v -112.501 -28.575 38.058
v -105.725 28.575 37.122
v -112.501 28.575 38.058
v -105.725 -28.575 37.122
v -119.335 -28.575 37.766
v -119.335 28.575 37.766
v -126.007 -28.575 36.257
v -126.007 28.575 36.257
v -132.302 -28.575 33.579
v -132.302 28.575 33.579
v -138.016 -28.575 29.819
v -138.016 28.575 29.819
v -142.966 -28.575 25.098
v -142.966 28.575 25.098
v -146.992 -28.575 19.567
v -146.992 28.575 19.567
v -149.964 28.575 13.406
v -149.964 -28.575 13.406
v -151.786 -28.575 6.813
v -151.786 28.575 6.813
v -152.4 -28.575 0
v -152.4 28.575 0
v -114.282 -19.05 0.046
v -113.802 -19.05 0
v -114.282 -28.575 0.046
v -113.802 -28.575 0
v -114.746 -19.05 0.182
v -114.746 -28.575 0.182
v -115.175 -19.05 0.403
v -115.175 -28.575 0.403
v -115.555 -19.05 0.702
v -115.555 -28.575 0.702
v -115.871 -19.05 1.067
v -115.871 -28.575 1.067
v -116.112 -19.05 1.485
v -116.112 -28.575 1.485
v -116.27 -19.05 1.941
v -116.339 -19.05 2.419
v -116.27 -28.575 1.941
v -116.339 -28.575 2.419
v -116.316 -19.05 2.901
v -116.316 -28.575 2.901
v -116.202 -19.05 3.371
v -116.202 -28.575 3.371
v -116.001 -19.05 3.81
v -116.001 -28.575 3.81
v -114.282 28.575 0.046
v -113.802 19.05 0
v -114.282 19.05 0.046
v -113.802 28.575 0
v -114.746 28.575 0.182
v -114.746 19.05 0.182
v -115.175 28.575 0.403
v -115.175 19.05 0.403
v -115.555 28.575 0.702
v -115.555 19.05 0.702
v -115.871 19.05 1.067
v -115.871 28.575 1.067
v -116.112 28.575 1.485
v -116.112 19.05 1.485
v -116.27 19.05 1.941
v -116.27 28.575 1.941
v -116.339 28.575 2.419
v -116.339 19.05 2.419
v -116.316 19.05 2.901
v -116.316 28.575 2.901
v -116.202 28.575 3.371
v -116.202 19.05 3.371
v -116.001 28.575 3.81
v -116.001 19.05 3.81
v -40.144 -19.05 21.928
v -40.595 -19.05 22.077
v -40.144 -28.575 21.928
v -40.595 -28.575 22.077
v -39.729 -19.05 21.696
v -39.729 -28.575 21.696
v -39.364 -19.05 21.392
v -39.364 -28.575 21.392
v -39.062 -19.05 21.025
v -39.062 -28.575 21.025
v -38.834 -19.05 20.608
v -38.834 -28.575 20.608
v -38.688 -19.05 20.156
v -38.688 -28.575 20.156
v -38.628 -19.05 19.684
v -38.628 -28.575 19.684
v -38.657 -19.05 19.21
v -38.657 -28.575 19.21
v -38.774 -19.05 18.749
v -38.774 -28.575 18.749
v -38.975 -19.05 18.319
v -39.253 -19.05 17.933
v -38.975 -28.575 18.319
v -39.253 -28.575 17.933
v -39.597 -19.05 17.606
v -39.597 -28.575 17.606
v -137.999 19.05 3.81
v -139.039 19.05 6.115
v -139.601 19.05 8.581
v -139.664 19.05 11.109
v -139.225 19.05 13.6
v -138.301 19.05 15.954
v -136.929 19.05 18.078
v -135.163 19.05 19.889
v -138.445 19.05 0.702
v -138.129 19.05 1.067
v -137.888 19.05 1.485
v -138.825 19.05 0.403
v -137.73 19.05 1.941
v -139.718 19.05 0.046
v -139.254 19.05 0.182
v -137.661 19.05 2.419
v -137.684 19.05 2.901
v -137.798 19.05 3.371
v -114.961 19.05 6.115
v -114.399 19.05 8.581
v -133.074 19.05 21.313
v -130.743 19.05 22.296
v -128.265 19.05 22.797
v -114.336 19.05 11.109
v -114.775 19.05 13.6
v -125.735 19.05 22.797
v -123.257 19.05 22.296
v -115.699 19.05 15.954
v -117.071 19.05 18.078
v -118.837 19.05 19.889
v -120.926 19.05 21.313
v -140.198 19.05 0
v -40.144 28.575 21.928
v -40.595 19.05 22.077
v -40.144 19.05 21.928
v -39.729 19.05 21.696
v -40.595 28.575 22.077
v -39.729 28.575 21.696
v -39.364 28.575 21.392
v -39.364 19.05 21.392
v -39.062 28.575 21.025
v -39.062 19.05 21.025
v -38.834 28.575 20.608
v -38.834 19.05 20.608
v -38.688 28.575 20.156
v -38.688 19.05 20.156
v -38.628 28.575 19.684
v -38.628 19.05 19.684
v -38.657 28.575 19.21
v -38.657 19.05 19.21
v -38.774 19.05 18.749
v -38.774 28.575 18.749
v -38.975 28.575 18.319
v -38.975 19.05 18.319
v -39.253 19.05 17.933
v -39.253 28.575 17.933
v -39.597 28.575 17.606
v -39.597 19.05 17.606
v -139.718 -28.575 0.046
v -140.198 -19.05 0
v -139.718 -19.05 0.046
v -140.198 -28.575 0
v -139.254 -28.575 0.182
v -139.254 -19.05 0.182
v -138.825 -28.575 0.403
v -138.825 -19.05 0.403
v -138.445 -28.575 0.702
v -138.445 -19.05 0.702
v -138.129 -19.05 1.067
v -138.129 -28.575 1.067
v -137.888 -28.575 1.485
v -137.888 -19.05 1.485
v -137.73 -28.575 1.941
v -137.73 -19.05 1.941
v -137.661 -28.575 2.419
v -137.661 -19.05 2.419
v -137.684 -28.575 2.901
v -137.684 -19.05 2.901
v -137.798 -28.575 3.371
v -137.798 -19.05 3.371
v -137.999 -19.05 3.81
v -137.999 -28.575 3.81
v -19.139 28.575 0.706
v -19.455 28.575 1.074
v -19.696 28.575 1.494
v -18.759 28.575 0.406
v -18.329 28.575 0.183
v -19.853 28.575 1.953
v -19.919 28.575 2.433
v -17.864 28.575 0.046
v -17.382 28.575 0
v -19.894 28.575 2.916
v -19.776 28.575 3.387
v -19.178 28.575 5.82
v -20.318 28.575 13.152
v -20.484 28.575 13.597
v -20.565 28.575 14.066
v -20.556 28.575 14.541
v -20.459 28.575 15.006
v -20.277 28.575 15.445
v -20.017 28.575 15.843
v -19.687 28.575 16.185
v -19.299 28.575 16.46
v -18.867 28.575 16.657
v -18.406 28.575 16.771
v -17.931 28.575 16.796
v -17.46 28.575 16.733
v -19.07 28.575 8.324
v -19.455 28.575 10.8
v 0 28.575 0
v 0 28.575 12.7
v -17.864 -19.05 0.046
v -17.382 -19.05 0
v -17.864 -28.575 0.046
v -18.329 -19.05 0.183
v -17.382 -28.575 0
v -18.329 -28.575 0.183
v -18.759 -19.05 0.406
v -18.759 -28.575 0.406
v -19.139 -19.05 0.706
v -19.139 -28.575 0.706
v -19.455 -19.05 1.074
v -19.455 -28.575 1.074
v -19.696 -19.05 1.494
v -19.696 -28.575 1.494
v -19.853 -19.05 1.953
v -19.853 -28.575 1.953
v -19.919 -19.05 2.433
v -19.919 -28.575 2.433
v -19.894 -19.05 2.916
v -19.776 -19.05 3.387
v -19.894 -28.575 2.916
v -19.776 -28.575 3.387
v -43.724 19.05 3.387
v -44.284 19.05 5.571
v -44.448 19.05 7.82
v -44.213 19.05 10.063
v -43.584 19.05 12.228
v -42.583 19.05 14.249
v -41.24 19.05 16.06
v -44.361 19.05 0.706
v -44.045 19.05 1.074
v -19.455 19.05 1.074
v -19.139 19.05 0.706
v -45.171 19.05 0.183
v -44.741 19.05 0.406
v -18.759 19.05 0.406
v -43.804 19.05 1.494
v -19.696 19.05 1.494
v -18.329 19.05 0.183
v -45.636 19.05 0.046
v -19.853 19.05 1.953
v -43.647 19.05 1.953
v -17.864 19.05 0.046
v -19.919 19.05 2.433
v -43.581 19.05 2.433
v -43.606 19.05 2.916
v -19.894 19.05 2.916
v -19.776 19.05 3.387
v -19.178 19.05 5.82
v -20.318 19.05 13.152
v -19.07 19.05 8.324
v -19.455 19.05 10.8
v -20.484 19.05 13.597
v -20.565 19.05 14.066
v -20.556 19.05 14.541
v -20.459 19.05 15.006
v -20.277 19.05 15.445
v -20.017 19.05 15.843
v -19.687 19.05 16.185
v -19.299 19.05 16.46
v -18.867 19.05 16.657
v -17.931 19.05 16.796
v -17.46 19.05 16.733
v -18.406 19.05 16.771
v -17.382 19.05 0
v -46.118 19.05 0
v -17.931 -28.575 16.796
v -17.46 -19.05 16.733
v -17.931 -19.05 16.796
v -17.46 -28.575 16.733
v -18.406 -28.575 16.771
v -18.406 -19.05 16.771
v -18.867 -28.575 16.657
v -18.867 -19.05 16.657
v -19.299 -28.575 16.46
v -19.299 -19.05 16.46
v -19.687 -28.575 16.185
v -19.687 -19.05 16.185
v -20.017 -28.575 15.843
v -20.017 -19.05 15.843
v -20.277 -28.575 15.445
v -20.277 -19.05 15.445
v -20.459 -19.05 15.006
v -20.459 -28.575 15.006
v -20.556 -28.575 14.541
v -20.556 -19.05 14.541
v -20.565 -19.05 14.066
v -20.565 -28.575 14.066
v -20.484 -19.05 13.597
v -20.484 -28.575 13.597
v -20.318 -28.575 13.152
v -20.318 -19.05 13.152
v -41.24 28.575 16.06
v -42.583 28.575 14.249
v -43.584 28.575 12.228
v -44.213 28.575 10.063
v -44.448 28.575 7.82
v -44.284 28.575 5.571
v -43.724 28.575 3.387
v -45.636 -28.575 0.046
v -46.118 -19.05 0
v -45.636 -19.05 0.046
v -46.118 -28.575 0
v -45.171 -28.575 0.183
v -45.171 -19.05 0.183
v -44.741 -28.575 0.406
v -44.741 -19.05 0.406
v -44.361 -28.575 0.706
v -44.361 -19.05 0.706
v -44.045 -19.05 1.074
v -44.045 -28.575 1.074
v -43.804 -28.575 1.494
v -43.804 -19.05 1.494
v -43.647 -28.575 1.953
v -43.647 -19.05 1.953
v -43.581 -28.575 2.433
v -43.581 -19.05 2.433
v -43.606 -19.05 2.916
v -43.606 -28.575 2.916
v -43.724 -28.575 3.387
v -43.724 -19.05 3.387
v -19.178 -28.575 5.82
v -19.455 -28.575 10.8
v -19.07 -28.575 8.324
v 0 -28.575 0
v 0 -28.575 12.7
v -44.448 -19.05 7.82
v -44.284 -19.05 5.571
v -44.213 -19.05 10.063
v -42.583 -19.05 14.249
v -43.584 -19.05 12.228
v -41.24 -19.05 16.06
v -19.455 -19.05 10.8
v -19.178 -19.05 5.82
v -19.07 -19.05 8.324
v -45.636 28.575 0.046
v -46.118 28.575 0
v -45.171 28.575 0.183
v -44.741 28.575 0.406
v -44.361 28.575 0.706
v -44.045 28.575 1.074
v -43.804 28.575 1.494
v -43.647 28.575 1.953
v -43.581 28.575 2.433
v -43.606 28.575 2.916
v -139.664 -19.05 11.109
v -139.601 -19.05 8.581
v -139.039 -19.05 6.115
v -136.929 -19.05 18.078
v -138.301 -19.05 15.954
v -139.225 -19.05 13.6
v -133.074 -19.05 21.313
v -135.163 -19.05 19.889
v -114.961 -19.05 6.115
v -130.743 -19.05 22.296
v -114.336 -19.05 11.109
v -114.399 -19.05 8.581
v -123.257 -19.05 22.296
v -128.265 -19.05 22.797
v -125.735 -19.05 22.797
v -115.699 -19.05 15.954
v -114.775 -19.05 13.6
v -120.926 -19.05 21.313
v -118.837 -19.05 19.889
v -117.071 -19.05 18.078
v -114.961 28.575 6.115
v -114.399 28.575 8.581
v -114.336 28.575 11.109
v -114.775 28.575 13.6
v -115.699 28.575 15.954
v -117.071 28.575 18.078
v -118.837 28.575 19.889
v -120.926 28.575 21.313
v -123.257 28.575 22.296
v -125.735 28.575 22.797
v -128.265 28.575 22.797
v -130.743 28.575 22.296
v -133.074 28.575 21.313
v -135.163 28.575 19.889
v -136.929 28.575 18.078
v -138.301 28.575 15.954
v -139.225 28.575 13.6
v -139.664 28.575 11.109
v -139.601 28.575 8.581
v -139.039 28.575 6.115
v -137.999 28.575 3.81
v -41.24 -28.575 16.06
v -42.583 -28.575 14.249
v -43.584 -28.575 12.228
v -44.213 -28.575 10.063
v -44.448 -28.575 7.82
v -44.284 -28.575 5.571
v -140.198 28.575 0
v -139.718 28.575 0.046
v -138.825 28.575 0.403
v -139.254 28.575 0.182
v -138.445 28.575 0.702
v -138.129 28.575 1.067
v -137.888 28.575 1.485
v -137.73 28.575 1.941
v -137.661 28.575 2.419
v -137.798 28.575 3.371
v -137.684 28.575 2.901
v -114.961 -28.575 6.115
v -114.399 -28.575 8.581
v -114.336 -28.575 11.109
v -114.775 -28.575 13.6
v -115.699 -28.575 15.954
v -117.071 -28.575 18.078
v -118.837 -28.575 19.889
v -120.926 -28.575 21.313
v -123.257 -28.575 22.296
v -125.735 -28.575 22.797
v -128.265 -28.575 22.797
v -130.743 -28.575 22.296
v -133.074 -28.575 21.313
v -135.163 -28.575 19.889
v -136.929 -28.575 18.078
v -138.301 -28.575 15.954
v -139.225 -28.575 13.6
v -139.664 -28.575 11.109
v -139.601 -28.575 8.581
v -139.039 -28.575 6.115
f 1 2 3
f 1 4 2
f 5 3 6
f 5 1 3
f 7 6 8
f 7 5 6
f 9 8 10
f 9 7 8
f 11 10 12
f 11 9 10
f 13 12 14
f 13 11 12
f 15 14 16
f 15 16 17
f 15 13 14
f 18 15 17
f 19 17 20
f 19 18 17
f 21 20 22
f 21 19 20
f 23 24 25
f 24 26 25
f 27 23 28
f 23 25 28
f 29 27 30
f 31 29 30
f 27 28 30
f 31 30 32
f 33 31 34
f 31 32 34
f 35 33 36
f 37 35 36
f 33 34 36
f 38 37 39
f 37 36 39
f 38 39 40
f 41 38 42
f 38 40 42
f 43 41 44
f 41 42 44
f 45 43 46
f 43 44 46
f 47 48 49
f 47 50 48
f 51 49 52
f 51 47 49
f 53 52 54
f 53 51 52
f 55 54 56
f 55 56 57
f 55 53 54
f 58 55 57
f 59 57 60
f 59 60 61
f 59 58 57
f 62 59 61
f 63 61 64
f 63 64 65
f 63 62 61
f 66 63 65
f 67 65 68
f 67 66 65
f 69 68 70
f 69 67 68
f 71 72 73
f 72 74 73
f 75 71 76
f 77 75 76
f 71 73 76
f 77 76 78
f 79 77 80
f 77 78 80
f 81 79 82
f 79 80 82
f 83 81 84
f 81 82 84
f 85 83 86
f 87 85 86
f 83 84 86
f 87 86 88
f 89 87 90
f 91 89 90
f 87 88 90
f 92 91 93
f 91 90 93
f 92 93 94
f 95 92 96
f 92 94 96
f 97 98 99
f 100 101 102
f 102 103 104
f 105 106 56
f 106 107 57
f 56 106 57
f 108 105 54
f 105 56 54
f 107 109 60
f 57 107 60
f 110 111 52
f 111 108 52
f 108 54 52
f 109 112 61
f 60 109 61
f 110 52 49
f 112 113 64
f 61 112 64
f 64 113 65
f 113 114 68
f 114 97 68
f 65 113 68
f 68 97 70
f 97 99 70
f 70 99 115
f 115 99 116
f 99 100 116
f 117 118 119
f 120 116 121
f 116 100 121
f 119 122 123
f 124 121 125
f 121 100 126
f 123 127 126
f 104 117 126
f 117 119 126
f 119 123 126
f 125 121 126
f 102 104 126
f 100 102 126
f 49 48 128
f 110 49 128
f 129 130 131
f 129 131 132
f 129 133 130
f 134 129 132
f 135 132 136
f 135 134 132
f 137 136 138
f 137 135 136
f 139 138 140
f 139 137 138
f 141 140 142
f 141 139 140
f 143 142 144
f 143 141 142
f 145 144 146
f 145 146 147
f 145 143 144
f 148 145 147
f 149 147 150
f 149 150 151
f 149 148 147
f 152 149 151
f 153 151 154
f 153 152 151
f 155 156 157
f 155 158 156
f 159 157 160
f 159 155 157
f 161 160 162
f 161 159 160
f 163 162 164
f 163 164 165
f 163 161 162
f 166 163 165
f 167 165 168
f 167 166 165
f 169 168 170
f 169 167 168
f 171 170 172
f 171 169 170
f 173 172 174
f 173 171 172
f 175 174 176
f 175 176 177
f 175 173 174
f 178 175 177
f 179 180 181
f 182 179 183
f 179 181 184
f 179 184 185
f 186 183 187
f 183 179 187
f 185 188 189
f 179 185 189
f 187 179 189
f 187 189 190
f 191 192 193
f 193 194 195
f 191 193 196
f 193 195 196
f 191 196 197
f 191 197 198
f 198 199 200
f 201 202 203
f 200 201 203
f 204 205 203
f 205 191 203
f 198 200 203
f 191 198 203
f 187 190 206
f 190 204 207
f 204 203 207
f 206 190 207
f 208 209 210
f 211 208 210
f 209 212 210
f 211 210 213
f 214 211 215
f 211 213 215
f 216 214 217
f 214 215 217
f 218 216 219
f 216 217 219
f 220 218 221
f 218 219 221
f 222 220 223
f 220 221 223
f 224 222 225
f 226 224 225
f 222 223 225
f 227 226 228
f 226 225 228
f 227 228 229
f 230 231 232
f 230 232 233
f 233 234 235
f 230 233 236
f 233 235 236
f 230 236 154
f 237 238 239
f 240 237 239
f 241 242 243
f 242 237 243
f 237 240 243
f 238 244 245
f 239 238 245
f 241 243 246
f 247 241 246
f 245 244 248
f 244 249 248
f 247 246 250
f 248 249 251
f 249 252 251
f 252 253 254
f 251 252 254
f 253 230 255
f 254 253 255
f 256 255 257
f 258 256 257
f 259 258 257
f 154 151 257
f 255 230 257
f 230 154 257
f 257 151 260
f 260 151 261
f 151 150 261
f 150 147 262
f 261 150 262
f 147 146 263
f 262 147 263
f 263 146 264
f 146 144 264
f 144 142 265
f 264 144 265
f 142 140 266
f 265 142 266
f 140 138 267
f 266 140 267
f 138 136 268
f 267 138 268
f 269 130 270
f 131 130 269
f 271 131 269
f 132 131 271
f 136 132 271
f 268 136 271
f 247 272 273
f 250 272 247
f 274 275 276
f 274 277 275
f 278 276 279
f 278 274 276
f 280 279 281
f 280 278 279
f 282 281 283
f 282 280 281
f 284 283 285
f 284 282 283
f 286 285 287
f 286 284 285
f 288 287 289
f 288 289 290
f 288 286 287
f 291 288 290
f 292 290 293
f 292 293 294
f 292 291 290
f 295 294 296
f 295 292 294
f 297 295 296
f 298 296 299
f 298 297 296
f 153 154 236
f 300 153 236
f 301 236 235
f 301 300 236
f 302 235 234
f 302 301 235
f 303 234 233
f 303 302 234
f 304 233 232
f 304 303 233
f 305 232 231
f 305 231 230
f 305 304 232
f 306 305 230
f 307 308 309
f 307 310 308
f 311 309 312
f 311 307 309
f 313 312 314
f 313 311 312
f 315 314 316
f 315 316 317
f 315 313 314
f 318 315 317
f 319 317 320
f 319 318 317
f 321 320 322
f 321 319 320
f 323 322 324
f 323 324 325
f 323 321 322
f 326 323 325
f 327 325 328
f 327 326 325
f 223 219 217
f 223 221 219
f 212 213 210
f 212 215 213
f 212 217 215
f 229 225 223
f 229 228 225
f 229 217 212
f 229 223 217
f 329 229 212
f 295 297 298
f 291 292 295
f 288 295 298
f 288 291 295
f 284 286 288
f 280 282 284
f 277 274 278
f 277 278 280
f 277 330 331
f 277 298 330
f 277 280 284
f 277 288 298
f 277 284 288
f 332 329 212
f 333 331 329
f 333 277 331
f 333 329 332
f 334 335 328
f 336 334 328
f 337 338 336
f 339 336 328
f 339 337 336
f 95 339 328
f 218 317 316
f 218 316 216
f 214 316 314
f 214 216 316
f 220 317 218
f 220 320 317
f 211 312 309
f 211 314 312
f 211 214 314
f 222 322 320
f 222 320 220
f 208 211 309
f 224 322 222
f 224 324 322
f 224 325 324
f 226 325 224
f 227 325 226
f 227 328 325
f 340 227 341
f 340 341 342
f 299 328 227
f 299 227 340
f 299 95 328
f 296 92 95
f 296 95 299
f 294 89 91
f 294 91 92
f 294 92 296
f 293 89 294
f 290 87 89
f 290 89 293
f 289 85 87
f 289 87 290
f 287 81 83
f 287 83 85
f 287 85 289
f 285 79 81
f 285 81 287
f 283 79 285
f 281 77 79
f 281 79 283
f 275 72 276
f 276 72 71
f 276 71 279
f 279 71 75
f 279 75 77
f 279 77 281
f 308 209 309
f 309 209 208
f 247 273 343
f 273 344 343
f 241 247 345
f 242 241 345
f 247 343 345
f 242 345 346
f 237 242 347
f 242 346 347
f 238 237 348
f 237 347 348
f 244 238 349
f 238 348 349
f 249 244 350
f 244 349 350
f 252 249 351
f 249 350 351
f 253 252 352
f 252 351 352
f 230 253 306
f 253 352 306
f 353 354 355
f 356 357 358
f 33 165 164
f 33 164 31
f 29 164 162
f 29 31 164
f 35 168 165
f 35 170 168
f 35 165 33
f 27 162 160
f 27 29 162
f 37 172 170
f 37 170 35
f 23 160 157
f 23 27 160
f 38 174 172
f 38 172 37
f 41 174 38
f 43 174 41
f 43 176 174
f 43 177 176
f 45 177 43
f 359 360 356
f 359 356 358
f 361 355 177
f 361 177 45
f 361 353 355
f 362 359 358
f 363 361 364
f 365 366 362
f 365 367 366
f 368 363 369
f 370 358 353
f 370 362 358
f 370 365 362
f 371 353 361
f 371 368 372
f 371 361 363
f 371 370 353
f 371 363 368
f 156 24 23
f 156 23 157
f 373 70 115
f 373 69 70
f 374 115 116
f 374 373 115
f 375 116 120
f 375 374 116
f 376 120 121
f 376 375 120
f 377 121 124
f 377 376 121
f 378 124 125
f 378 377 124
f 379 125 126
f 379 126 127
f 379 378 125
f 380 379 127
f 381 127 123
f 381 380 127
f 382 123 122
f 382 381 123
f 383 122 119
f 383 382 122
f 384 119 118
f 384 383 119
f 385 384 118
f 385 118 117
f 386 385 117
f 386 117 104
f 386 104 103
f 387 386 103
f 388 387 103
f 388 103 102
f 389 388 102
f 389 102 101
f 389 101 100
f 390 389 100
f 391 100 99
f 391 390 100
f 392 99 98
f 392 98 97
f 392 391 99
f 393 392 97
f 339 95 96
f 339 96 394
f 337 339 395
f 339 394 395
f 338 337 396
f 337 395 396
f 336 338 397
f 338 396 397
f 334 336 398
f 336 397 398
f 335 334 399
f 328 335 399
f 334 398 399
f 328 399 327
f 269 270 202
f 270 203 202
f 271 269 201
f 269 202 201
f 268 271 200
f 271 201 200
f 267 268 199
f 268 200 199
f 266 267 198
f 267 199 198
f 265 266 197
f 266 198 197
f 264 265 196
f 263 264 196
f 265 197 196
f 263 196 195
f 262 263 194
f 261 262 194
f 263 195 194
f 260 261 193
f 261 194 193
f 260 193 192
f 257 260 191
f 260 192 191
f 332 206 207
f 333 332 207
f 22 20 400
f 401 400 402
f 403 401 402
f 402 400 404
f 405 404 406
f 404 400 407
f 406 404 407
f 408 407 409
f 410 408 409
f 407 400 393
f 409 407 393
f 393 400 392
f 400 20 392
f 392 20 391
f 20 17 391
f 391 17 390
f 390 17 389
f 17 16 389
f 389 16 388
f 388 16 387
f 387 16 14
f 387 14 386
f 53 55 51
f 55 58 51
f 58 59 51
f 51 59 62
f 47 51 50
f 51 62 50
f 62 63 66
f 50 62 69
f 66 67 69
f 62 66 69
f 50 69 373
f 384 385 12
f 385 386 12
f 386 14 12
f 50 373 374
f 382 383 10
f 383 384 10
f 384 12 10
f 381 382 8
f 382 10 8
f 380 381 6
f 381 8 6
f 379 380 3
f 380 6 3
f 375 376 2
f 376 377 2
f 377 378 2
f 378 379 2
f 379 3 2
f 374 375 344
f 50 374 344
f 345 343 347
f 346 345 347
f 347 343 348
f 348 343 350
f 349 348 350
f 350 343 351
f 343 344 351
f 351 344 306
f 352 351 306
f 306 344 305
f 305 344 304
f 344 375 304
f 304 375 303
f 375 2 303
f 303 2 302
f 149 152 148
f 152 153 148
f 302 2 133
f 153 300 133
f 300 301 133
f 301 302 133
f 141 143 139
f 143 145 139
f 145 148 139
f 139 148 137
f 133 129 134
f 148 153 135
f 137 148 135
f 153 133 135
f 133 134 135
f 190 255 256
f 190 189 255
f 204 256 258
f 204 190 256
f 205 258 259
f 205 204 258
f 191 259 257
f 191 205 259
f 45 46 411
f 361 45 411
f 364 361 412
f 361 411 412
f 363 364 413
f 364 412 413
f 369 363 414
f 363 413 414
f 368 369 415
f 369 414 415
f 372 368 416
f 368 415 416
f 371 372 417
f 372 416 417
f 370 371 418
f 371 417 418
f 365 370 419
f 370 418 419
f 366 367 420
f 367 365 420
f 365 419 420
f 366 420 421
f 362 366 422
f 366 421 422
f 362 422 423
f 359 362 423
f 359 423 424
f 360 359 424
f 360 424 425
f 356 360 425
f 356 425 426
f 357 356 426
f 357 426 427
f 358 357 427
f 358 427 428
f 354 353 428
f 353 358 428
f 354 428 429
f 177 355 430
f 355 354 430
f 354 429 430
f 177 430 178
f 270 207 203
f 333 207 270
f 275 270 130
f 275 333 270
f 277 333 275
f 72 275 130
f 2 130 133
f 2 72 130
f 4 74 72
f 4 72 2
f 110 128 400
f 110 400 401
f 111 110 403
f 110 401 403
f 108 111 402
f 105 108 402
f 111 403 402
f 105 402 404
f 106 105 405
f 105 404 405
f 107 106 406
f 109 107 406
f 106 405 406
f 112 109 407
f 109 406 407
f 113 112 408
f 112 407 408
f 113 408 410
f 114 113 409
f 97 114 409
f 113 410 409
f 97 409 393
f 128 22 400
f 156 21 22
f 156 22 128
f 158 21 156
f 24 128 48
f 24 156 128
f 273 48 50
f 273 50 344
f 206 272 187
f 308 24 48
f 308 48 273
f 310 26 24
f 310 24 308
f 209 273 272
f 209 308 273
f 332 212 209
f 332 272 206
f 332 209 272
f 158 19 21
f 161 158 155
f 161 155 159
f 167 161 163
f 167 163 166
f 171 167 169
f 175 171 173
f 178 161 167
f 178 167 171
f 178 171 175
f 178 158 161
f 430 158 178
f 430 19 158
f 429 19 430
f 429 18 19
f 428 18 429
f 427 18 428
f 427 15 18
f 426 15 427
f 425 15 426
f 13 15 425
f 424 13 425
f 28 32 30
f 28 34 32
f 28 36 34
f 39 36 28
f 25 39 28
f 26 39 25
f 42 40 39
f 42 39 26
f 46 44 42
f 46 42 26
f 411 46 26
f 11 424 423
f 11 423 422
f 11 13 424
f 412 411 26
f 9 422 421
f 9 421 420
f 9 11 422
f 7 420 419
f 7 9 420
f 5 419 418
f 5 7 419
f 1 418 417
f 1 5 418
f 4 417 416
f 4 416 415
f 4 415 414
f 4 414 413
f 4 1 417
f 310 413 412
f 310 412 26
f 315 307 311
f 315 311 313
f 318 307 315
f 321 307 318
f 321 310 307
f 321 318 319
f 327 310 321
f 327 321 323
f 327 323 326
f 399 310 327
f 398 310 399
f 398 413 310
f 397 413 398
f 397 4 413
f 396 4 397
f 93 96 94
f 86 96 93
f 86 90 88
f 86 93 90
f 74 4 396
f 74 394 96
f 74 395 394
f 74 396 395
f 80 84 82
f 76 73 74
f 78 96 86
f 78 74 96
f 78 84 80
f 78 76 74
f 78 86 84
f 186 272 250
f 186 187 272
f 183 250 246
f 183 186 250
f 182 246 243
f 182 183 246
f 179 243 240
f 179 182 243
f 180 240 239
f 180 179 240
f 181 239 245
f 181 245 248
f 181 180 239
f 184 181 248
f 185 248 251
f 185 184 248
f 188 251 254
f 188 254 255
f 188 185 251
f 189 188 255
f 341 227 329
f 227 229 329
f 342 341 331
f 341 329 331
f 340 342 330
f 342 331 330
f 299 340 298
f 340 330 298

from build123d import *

# Parameters (mm, degrees)
F1_DEPTH = 28.575
F2_R     = 12.7
F3_DEPTH = 9.525
F4_R     = 2.54


# Not quite as in the source:
# - a pattern or mirror of a feature is missing from the dataset's text; its kind, count and spacing are read off the source's solid


with BuildPart() as f1:
    # F0 (on Front) → F1 (new body, symmetric)
    with BuildSketch(Plane.XZ):
        with BuildLine():
            Line((-152.4, 0), (0, 0))
            Line((0, 0), (0, 12.7))
            Line((0, 12.7), (-105.7247139353, 37.1224254179))
            ThreePointArc((-105.7247139353, 37.1224254179), (-138.0159397973, 29.8188564424), (-152.4, 0))
        make_face()
    extrude(amount=F1_DEPTH, both=True)

    # F2 (on face) → F3 (cut)
    with BuildSketch(Plane.XZ.offset(28.575)):
        with Locations((-127, 10.16)):
            Circle(F2_R)
        with Locations((-31.75, 7.62)):
            Circle(F2_R)
    f3 = extrude(amount=-F3_DEPTH, mode=Mode.SUBTRACT)

    # F3_copies: F3 across plane
    add(f3.mirror(Plane.ZX), mode=Mode.SUBTRACT)

    # F4
    f4_edges = [f1.edges().sort_by_distance(p)[0] for p in [
        (-25.256061, -23.8125, 18.534154),
        (-32.799092, -23.8125, 20.276595),
        (-41.91, -23.8125, 0),
        (-21.59, -23.8125, 0),
        (-134.62, -23.8125, 0),
        (-119.38, -23.8125, 0),
        (-21.59, 23.8125, 0),
        (-41.91, 23.8125, 0),
        (-119.38, 23.8125, 0),
        (-134.62, 23.8125, 0),
        (-32.799092, 23.8125, 20.276595),
        (-25.256061, 23.8125, 18.534154),
    ]]
    fillet(f4_edges, radius=F4_R)


solid = f1.part
